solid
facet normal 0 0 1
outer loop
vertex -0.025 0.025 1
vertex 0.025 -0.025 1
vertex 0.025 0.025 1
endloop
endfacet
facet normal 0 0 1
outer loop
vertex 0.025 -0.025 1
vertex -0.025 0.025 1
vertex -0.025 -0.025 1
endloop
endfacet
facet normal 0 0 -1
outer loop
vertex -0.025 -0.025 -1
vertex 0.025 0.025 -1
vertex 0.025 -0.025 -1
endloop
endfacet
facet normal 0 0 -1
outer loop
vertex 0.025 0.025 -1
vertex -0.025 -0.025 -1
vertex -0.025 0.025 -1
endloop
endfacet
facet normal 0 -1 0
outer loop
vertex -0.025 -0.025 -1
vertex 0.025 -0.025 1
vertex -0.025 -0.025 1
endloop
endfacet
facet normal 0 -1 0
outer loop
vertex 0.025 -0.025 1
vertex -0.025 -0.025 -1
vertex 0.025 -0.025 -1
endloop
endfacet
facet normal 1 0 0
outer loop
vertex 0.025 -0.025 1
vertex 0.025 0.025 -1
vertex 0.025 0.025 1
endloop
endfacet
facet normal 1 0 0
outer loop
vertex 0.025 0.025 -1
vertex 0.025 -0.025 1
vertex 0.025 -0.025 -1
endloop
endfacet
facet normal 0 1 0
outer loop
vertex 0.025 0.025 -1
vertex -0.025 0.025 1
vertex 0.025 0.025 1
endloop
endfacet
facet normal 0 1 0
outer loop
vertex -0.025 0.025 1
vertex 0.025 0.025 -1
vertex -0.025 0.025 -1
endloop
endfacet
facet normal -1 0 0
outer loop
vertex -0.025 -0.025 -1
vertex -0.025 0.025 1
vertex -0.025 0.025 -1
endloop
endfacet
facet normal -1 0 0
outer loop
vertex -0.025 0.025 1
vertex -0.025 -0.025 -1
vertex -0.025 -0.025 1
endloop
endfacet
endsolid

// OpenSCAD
module cross(length, diameter) {
    union() {
        translate([0, 0, 0]) rotate([0, 0, 0]) cube([diameter, diameter, length], center=true);
        //translate([0, 0, 0]) rotate([0, 90, 0]) cube([diameter, diameter, length], center=true);
        //translate([0, 0, 0]) rotate([90, 0, 0]) cube([diameter, diameter, length], center=true);
    }
}

cross(2, 0.05);
